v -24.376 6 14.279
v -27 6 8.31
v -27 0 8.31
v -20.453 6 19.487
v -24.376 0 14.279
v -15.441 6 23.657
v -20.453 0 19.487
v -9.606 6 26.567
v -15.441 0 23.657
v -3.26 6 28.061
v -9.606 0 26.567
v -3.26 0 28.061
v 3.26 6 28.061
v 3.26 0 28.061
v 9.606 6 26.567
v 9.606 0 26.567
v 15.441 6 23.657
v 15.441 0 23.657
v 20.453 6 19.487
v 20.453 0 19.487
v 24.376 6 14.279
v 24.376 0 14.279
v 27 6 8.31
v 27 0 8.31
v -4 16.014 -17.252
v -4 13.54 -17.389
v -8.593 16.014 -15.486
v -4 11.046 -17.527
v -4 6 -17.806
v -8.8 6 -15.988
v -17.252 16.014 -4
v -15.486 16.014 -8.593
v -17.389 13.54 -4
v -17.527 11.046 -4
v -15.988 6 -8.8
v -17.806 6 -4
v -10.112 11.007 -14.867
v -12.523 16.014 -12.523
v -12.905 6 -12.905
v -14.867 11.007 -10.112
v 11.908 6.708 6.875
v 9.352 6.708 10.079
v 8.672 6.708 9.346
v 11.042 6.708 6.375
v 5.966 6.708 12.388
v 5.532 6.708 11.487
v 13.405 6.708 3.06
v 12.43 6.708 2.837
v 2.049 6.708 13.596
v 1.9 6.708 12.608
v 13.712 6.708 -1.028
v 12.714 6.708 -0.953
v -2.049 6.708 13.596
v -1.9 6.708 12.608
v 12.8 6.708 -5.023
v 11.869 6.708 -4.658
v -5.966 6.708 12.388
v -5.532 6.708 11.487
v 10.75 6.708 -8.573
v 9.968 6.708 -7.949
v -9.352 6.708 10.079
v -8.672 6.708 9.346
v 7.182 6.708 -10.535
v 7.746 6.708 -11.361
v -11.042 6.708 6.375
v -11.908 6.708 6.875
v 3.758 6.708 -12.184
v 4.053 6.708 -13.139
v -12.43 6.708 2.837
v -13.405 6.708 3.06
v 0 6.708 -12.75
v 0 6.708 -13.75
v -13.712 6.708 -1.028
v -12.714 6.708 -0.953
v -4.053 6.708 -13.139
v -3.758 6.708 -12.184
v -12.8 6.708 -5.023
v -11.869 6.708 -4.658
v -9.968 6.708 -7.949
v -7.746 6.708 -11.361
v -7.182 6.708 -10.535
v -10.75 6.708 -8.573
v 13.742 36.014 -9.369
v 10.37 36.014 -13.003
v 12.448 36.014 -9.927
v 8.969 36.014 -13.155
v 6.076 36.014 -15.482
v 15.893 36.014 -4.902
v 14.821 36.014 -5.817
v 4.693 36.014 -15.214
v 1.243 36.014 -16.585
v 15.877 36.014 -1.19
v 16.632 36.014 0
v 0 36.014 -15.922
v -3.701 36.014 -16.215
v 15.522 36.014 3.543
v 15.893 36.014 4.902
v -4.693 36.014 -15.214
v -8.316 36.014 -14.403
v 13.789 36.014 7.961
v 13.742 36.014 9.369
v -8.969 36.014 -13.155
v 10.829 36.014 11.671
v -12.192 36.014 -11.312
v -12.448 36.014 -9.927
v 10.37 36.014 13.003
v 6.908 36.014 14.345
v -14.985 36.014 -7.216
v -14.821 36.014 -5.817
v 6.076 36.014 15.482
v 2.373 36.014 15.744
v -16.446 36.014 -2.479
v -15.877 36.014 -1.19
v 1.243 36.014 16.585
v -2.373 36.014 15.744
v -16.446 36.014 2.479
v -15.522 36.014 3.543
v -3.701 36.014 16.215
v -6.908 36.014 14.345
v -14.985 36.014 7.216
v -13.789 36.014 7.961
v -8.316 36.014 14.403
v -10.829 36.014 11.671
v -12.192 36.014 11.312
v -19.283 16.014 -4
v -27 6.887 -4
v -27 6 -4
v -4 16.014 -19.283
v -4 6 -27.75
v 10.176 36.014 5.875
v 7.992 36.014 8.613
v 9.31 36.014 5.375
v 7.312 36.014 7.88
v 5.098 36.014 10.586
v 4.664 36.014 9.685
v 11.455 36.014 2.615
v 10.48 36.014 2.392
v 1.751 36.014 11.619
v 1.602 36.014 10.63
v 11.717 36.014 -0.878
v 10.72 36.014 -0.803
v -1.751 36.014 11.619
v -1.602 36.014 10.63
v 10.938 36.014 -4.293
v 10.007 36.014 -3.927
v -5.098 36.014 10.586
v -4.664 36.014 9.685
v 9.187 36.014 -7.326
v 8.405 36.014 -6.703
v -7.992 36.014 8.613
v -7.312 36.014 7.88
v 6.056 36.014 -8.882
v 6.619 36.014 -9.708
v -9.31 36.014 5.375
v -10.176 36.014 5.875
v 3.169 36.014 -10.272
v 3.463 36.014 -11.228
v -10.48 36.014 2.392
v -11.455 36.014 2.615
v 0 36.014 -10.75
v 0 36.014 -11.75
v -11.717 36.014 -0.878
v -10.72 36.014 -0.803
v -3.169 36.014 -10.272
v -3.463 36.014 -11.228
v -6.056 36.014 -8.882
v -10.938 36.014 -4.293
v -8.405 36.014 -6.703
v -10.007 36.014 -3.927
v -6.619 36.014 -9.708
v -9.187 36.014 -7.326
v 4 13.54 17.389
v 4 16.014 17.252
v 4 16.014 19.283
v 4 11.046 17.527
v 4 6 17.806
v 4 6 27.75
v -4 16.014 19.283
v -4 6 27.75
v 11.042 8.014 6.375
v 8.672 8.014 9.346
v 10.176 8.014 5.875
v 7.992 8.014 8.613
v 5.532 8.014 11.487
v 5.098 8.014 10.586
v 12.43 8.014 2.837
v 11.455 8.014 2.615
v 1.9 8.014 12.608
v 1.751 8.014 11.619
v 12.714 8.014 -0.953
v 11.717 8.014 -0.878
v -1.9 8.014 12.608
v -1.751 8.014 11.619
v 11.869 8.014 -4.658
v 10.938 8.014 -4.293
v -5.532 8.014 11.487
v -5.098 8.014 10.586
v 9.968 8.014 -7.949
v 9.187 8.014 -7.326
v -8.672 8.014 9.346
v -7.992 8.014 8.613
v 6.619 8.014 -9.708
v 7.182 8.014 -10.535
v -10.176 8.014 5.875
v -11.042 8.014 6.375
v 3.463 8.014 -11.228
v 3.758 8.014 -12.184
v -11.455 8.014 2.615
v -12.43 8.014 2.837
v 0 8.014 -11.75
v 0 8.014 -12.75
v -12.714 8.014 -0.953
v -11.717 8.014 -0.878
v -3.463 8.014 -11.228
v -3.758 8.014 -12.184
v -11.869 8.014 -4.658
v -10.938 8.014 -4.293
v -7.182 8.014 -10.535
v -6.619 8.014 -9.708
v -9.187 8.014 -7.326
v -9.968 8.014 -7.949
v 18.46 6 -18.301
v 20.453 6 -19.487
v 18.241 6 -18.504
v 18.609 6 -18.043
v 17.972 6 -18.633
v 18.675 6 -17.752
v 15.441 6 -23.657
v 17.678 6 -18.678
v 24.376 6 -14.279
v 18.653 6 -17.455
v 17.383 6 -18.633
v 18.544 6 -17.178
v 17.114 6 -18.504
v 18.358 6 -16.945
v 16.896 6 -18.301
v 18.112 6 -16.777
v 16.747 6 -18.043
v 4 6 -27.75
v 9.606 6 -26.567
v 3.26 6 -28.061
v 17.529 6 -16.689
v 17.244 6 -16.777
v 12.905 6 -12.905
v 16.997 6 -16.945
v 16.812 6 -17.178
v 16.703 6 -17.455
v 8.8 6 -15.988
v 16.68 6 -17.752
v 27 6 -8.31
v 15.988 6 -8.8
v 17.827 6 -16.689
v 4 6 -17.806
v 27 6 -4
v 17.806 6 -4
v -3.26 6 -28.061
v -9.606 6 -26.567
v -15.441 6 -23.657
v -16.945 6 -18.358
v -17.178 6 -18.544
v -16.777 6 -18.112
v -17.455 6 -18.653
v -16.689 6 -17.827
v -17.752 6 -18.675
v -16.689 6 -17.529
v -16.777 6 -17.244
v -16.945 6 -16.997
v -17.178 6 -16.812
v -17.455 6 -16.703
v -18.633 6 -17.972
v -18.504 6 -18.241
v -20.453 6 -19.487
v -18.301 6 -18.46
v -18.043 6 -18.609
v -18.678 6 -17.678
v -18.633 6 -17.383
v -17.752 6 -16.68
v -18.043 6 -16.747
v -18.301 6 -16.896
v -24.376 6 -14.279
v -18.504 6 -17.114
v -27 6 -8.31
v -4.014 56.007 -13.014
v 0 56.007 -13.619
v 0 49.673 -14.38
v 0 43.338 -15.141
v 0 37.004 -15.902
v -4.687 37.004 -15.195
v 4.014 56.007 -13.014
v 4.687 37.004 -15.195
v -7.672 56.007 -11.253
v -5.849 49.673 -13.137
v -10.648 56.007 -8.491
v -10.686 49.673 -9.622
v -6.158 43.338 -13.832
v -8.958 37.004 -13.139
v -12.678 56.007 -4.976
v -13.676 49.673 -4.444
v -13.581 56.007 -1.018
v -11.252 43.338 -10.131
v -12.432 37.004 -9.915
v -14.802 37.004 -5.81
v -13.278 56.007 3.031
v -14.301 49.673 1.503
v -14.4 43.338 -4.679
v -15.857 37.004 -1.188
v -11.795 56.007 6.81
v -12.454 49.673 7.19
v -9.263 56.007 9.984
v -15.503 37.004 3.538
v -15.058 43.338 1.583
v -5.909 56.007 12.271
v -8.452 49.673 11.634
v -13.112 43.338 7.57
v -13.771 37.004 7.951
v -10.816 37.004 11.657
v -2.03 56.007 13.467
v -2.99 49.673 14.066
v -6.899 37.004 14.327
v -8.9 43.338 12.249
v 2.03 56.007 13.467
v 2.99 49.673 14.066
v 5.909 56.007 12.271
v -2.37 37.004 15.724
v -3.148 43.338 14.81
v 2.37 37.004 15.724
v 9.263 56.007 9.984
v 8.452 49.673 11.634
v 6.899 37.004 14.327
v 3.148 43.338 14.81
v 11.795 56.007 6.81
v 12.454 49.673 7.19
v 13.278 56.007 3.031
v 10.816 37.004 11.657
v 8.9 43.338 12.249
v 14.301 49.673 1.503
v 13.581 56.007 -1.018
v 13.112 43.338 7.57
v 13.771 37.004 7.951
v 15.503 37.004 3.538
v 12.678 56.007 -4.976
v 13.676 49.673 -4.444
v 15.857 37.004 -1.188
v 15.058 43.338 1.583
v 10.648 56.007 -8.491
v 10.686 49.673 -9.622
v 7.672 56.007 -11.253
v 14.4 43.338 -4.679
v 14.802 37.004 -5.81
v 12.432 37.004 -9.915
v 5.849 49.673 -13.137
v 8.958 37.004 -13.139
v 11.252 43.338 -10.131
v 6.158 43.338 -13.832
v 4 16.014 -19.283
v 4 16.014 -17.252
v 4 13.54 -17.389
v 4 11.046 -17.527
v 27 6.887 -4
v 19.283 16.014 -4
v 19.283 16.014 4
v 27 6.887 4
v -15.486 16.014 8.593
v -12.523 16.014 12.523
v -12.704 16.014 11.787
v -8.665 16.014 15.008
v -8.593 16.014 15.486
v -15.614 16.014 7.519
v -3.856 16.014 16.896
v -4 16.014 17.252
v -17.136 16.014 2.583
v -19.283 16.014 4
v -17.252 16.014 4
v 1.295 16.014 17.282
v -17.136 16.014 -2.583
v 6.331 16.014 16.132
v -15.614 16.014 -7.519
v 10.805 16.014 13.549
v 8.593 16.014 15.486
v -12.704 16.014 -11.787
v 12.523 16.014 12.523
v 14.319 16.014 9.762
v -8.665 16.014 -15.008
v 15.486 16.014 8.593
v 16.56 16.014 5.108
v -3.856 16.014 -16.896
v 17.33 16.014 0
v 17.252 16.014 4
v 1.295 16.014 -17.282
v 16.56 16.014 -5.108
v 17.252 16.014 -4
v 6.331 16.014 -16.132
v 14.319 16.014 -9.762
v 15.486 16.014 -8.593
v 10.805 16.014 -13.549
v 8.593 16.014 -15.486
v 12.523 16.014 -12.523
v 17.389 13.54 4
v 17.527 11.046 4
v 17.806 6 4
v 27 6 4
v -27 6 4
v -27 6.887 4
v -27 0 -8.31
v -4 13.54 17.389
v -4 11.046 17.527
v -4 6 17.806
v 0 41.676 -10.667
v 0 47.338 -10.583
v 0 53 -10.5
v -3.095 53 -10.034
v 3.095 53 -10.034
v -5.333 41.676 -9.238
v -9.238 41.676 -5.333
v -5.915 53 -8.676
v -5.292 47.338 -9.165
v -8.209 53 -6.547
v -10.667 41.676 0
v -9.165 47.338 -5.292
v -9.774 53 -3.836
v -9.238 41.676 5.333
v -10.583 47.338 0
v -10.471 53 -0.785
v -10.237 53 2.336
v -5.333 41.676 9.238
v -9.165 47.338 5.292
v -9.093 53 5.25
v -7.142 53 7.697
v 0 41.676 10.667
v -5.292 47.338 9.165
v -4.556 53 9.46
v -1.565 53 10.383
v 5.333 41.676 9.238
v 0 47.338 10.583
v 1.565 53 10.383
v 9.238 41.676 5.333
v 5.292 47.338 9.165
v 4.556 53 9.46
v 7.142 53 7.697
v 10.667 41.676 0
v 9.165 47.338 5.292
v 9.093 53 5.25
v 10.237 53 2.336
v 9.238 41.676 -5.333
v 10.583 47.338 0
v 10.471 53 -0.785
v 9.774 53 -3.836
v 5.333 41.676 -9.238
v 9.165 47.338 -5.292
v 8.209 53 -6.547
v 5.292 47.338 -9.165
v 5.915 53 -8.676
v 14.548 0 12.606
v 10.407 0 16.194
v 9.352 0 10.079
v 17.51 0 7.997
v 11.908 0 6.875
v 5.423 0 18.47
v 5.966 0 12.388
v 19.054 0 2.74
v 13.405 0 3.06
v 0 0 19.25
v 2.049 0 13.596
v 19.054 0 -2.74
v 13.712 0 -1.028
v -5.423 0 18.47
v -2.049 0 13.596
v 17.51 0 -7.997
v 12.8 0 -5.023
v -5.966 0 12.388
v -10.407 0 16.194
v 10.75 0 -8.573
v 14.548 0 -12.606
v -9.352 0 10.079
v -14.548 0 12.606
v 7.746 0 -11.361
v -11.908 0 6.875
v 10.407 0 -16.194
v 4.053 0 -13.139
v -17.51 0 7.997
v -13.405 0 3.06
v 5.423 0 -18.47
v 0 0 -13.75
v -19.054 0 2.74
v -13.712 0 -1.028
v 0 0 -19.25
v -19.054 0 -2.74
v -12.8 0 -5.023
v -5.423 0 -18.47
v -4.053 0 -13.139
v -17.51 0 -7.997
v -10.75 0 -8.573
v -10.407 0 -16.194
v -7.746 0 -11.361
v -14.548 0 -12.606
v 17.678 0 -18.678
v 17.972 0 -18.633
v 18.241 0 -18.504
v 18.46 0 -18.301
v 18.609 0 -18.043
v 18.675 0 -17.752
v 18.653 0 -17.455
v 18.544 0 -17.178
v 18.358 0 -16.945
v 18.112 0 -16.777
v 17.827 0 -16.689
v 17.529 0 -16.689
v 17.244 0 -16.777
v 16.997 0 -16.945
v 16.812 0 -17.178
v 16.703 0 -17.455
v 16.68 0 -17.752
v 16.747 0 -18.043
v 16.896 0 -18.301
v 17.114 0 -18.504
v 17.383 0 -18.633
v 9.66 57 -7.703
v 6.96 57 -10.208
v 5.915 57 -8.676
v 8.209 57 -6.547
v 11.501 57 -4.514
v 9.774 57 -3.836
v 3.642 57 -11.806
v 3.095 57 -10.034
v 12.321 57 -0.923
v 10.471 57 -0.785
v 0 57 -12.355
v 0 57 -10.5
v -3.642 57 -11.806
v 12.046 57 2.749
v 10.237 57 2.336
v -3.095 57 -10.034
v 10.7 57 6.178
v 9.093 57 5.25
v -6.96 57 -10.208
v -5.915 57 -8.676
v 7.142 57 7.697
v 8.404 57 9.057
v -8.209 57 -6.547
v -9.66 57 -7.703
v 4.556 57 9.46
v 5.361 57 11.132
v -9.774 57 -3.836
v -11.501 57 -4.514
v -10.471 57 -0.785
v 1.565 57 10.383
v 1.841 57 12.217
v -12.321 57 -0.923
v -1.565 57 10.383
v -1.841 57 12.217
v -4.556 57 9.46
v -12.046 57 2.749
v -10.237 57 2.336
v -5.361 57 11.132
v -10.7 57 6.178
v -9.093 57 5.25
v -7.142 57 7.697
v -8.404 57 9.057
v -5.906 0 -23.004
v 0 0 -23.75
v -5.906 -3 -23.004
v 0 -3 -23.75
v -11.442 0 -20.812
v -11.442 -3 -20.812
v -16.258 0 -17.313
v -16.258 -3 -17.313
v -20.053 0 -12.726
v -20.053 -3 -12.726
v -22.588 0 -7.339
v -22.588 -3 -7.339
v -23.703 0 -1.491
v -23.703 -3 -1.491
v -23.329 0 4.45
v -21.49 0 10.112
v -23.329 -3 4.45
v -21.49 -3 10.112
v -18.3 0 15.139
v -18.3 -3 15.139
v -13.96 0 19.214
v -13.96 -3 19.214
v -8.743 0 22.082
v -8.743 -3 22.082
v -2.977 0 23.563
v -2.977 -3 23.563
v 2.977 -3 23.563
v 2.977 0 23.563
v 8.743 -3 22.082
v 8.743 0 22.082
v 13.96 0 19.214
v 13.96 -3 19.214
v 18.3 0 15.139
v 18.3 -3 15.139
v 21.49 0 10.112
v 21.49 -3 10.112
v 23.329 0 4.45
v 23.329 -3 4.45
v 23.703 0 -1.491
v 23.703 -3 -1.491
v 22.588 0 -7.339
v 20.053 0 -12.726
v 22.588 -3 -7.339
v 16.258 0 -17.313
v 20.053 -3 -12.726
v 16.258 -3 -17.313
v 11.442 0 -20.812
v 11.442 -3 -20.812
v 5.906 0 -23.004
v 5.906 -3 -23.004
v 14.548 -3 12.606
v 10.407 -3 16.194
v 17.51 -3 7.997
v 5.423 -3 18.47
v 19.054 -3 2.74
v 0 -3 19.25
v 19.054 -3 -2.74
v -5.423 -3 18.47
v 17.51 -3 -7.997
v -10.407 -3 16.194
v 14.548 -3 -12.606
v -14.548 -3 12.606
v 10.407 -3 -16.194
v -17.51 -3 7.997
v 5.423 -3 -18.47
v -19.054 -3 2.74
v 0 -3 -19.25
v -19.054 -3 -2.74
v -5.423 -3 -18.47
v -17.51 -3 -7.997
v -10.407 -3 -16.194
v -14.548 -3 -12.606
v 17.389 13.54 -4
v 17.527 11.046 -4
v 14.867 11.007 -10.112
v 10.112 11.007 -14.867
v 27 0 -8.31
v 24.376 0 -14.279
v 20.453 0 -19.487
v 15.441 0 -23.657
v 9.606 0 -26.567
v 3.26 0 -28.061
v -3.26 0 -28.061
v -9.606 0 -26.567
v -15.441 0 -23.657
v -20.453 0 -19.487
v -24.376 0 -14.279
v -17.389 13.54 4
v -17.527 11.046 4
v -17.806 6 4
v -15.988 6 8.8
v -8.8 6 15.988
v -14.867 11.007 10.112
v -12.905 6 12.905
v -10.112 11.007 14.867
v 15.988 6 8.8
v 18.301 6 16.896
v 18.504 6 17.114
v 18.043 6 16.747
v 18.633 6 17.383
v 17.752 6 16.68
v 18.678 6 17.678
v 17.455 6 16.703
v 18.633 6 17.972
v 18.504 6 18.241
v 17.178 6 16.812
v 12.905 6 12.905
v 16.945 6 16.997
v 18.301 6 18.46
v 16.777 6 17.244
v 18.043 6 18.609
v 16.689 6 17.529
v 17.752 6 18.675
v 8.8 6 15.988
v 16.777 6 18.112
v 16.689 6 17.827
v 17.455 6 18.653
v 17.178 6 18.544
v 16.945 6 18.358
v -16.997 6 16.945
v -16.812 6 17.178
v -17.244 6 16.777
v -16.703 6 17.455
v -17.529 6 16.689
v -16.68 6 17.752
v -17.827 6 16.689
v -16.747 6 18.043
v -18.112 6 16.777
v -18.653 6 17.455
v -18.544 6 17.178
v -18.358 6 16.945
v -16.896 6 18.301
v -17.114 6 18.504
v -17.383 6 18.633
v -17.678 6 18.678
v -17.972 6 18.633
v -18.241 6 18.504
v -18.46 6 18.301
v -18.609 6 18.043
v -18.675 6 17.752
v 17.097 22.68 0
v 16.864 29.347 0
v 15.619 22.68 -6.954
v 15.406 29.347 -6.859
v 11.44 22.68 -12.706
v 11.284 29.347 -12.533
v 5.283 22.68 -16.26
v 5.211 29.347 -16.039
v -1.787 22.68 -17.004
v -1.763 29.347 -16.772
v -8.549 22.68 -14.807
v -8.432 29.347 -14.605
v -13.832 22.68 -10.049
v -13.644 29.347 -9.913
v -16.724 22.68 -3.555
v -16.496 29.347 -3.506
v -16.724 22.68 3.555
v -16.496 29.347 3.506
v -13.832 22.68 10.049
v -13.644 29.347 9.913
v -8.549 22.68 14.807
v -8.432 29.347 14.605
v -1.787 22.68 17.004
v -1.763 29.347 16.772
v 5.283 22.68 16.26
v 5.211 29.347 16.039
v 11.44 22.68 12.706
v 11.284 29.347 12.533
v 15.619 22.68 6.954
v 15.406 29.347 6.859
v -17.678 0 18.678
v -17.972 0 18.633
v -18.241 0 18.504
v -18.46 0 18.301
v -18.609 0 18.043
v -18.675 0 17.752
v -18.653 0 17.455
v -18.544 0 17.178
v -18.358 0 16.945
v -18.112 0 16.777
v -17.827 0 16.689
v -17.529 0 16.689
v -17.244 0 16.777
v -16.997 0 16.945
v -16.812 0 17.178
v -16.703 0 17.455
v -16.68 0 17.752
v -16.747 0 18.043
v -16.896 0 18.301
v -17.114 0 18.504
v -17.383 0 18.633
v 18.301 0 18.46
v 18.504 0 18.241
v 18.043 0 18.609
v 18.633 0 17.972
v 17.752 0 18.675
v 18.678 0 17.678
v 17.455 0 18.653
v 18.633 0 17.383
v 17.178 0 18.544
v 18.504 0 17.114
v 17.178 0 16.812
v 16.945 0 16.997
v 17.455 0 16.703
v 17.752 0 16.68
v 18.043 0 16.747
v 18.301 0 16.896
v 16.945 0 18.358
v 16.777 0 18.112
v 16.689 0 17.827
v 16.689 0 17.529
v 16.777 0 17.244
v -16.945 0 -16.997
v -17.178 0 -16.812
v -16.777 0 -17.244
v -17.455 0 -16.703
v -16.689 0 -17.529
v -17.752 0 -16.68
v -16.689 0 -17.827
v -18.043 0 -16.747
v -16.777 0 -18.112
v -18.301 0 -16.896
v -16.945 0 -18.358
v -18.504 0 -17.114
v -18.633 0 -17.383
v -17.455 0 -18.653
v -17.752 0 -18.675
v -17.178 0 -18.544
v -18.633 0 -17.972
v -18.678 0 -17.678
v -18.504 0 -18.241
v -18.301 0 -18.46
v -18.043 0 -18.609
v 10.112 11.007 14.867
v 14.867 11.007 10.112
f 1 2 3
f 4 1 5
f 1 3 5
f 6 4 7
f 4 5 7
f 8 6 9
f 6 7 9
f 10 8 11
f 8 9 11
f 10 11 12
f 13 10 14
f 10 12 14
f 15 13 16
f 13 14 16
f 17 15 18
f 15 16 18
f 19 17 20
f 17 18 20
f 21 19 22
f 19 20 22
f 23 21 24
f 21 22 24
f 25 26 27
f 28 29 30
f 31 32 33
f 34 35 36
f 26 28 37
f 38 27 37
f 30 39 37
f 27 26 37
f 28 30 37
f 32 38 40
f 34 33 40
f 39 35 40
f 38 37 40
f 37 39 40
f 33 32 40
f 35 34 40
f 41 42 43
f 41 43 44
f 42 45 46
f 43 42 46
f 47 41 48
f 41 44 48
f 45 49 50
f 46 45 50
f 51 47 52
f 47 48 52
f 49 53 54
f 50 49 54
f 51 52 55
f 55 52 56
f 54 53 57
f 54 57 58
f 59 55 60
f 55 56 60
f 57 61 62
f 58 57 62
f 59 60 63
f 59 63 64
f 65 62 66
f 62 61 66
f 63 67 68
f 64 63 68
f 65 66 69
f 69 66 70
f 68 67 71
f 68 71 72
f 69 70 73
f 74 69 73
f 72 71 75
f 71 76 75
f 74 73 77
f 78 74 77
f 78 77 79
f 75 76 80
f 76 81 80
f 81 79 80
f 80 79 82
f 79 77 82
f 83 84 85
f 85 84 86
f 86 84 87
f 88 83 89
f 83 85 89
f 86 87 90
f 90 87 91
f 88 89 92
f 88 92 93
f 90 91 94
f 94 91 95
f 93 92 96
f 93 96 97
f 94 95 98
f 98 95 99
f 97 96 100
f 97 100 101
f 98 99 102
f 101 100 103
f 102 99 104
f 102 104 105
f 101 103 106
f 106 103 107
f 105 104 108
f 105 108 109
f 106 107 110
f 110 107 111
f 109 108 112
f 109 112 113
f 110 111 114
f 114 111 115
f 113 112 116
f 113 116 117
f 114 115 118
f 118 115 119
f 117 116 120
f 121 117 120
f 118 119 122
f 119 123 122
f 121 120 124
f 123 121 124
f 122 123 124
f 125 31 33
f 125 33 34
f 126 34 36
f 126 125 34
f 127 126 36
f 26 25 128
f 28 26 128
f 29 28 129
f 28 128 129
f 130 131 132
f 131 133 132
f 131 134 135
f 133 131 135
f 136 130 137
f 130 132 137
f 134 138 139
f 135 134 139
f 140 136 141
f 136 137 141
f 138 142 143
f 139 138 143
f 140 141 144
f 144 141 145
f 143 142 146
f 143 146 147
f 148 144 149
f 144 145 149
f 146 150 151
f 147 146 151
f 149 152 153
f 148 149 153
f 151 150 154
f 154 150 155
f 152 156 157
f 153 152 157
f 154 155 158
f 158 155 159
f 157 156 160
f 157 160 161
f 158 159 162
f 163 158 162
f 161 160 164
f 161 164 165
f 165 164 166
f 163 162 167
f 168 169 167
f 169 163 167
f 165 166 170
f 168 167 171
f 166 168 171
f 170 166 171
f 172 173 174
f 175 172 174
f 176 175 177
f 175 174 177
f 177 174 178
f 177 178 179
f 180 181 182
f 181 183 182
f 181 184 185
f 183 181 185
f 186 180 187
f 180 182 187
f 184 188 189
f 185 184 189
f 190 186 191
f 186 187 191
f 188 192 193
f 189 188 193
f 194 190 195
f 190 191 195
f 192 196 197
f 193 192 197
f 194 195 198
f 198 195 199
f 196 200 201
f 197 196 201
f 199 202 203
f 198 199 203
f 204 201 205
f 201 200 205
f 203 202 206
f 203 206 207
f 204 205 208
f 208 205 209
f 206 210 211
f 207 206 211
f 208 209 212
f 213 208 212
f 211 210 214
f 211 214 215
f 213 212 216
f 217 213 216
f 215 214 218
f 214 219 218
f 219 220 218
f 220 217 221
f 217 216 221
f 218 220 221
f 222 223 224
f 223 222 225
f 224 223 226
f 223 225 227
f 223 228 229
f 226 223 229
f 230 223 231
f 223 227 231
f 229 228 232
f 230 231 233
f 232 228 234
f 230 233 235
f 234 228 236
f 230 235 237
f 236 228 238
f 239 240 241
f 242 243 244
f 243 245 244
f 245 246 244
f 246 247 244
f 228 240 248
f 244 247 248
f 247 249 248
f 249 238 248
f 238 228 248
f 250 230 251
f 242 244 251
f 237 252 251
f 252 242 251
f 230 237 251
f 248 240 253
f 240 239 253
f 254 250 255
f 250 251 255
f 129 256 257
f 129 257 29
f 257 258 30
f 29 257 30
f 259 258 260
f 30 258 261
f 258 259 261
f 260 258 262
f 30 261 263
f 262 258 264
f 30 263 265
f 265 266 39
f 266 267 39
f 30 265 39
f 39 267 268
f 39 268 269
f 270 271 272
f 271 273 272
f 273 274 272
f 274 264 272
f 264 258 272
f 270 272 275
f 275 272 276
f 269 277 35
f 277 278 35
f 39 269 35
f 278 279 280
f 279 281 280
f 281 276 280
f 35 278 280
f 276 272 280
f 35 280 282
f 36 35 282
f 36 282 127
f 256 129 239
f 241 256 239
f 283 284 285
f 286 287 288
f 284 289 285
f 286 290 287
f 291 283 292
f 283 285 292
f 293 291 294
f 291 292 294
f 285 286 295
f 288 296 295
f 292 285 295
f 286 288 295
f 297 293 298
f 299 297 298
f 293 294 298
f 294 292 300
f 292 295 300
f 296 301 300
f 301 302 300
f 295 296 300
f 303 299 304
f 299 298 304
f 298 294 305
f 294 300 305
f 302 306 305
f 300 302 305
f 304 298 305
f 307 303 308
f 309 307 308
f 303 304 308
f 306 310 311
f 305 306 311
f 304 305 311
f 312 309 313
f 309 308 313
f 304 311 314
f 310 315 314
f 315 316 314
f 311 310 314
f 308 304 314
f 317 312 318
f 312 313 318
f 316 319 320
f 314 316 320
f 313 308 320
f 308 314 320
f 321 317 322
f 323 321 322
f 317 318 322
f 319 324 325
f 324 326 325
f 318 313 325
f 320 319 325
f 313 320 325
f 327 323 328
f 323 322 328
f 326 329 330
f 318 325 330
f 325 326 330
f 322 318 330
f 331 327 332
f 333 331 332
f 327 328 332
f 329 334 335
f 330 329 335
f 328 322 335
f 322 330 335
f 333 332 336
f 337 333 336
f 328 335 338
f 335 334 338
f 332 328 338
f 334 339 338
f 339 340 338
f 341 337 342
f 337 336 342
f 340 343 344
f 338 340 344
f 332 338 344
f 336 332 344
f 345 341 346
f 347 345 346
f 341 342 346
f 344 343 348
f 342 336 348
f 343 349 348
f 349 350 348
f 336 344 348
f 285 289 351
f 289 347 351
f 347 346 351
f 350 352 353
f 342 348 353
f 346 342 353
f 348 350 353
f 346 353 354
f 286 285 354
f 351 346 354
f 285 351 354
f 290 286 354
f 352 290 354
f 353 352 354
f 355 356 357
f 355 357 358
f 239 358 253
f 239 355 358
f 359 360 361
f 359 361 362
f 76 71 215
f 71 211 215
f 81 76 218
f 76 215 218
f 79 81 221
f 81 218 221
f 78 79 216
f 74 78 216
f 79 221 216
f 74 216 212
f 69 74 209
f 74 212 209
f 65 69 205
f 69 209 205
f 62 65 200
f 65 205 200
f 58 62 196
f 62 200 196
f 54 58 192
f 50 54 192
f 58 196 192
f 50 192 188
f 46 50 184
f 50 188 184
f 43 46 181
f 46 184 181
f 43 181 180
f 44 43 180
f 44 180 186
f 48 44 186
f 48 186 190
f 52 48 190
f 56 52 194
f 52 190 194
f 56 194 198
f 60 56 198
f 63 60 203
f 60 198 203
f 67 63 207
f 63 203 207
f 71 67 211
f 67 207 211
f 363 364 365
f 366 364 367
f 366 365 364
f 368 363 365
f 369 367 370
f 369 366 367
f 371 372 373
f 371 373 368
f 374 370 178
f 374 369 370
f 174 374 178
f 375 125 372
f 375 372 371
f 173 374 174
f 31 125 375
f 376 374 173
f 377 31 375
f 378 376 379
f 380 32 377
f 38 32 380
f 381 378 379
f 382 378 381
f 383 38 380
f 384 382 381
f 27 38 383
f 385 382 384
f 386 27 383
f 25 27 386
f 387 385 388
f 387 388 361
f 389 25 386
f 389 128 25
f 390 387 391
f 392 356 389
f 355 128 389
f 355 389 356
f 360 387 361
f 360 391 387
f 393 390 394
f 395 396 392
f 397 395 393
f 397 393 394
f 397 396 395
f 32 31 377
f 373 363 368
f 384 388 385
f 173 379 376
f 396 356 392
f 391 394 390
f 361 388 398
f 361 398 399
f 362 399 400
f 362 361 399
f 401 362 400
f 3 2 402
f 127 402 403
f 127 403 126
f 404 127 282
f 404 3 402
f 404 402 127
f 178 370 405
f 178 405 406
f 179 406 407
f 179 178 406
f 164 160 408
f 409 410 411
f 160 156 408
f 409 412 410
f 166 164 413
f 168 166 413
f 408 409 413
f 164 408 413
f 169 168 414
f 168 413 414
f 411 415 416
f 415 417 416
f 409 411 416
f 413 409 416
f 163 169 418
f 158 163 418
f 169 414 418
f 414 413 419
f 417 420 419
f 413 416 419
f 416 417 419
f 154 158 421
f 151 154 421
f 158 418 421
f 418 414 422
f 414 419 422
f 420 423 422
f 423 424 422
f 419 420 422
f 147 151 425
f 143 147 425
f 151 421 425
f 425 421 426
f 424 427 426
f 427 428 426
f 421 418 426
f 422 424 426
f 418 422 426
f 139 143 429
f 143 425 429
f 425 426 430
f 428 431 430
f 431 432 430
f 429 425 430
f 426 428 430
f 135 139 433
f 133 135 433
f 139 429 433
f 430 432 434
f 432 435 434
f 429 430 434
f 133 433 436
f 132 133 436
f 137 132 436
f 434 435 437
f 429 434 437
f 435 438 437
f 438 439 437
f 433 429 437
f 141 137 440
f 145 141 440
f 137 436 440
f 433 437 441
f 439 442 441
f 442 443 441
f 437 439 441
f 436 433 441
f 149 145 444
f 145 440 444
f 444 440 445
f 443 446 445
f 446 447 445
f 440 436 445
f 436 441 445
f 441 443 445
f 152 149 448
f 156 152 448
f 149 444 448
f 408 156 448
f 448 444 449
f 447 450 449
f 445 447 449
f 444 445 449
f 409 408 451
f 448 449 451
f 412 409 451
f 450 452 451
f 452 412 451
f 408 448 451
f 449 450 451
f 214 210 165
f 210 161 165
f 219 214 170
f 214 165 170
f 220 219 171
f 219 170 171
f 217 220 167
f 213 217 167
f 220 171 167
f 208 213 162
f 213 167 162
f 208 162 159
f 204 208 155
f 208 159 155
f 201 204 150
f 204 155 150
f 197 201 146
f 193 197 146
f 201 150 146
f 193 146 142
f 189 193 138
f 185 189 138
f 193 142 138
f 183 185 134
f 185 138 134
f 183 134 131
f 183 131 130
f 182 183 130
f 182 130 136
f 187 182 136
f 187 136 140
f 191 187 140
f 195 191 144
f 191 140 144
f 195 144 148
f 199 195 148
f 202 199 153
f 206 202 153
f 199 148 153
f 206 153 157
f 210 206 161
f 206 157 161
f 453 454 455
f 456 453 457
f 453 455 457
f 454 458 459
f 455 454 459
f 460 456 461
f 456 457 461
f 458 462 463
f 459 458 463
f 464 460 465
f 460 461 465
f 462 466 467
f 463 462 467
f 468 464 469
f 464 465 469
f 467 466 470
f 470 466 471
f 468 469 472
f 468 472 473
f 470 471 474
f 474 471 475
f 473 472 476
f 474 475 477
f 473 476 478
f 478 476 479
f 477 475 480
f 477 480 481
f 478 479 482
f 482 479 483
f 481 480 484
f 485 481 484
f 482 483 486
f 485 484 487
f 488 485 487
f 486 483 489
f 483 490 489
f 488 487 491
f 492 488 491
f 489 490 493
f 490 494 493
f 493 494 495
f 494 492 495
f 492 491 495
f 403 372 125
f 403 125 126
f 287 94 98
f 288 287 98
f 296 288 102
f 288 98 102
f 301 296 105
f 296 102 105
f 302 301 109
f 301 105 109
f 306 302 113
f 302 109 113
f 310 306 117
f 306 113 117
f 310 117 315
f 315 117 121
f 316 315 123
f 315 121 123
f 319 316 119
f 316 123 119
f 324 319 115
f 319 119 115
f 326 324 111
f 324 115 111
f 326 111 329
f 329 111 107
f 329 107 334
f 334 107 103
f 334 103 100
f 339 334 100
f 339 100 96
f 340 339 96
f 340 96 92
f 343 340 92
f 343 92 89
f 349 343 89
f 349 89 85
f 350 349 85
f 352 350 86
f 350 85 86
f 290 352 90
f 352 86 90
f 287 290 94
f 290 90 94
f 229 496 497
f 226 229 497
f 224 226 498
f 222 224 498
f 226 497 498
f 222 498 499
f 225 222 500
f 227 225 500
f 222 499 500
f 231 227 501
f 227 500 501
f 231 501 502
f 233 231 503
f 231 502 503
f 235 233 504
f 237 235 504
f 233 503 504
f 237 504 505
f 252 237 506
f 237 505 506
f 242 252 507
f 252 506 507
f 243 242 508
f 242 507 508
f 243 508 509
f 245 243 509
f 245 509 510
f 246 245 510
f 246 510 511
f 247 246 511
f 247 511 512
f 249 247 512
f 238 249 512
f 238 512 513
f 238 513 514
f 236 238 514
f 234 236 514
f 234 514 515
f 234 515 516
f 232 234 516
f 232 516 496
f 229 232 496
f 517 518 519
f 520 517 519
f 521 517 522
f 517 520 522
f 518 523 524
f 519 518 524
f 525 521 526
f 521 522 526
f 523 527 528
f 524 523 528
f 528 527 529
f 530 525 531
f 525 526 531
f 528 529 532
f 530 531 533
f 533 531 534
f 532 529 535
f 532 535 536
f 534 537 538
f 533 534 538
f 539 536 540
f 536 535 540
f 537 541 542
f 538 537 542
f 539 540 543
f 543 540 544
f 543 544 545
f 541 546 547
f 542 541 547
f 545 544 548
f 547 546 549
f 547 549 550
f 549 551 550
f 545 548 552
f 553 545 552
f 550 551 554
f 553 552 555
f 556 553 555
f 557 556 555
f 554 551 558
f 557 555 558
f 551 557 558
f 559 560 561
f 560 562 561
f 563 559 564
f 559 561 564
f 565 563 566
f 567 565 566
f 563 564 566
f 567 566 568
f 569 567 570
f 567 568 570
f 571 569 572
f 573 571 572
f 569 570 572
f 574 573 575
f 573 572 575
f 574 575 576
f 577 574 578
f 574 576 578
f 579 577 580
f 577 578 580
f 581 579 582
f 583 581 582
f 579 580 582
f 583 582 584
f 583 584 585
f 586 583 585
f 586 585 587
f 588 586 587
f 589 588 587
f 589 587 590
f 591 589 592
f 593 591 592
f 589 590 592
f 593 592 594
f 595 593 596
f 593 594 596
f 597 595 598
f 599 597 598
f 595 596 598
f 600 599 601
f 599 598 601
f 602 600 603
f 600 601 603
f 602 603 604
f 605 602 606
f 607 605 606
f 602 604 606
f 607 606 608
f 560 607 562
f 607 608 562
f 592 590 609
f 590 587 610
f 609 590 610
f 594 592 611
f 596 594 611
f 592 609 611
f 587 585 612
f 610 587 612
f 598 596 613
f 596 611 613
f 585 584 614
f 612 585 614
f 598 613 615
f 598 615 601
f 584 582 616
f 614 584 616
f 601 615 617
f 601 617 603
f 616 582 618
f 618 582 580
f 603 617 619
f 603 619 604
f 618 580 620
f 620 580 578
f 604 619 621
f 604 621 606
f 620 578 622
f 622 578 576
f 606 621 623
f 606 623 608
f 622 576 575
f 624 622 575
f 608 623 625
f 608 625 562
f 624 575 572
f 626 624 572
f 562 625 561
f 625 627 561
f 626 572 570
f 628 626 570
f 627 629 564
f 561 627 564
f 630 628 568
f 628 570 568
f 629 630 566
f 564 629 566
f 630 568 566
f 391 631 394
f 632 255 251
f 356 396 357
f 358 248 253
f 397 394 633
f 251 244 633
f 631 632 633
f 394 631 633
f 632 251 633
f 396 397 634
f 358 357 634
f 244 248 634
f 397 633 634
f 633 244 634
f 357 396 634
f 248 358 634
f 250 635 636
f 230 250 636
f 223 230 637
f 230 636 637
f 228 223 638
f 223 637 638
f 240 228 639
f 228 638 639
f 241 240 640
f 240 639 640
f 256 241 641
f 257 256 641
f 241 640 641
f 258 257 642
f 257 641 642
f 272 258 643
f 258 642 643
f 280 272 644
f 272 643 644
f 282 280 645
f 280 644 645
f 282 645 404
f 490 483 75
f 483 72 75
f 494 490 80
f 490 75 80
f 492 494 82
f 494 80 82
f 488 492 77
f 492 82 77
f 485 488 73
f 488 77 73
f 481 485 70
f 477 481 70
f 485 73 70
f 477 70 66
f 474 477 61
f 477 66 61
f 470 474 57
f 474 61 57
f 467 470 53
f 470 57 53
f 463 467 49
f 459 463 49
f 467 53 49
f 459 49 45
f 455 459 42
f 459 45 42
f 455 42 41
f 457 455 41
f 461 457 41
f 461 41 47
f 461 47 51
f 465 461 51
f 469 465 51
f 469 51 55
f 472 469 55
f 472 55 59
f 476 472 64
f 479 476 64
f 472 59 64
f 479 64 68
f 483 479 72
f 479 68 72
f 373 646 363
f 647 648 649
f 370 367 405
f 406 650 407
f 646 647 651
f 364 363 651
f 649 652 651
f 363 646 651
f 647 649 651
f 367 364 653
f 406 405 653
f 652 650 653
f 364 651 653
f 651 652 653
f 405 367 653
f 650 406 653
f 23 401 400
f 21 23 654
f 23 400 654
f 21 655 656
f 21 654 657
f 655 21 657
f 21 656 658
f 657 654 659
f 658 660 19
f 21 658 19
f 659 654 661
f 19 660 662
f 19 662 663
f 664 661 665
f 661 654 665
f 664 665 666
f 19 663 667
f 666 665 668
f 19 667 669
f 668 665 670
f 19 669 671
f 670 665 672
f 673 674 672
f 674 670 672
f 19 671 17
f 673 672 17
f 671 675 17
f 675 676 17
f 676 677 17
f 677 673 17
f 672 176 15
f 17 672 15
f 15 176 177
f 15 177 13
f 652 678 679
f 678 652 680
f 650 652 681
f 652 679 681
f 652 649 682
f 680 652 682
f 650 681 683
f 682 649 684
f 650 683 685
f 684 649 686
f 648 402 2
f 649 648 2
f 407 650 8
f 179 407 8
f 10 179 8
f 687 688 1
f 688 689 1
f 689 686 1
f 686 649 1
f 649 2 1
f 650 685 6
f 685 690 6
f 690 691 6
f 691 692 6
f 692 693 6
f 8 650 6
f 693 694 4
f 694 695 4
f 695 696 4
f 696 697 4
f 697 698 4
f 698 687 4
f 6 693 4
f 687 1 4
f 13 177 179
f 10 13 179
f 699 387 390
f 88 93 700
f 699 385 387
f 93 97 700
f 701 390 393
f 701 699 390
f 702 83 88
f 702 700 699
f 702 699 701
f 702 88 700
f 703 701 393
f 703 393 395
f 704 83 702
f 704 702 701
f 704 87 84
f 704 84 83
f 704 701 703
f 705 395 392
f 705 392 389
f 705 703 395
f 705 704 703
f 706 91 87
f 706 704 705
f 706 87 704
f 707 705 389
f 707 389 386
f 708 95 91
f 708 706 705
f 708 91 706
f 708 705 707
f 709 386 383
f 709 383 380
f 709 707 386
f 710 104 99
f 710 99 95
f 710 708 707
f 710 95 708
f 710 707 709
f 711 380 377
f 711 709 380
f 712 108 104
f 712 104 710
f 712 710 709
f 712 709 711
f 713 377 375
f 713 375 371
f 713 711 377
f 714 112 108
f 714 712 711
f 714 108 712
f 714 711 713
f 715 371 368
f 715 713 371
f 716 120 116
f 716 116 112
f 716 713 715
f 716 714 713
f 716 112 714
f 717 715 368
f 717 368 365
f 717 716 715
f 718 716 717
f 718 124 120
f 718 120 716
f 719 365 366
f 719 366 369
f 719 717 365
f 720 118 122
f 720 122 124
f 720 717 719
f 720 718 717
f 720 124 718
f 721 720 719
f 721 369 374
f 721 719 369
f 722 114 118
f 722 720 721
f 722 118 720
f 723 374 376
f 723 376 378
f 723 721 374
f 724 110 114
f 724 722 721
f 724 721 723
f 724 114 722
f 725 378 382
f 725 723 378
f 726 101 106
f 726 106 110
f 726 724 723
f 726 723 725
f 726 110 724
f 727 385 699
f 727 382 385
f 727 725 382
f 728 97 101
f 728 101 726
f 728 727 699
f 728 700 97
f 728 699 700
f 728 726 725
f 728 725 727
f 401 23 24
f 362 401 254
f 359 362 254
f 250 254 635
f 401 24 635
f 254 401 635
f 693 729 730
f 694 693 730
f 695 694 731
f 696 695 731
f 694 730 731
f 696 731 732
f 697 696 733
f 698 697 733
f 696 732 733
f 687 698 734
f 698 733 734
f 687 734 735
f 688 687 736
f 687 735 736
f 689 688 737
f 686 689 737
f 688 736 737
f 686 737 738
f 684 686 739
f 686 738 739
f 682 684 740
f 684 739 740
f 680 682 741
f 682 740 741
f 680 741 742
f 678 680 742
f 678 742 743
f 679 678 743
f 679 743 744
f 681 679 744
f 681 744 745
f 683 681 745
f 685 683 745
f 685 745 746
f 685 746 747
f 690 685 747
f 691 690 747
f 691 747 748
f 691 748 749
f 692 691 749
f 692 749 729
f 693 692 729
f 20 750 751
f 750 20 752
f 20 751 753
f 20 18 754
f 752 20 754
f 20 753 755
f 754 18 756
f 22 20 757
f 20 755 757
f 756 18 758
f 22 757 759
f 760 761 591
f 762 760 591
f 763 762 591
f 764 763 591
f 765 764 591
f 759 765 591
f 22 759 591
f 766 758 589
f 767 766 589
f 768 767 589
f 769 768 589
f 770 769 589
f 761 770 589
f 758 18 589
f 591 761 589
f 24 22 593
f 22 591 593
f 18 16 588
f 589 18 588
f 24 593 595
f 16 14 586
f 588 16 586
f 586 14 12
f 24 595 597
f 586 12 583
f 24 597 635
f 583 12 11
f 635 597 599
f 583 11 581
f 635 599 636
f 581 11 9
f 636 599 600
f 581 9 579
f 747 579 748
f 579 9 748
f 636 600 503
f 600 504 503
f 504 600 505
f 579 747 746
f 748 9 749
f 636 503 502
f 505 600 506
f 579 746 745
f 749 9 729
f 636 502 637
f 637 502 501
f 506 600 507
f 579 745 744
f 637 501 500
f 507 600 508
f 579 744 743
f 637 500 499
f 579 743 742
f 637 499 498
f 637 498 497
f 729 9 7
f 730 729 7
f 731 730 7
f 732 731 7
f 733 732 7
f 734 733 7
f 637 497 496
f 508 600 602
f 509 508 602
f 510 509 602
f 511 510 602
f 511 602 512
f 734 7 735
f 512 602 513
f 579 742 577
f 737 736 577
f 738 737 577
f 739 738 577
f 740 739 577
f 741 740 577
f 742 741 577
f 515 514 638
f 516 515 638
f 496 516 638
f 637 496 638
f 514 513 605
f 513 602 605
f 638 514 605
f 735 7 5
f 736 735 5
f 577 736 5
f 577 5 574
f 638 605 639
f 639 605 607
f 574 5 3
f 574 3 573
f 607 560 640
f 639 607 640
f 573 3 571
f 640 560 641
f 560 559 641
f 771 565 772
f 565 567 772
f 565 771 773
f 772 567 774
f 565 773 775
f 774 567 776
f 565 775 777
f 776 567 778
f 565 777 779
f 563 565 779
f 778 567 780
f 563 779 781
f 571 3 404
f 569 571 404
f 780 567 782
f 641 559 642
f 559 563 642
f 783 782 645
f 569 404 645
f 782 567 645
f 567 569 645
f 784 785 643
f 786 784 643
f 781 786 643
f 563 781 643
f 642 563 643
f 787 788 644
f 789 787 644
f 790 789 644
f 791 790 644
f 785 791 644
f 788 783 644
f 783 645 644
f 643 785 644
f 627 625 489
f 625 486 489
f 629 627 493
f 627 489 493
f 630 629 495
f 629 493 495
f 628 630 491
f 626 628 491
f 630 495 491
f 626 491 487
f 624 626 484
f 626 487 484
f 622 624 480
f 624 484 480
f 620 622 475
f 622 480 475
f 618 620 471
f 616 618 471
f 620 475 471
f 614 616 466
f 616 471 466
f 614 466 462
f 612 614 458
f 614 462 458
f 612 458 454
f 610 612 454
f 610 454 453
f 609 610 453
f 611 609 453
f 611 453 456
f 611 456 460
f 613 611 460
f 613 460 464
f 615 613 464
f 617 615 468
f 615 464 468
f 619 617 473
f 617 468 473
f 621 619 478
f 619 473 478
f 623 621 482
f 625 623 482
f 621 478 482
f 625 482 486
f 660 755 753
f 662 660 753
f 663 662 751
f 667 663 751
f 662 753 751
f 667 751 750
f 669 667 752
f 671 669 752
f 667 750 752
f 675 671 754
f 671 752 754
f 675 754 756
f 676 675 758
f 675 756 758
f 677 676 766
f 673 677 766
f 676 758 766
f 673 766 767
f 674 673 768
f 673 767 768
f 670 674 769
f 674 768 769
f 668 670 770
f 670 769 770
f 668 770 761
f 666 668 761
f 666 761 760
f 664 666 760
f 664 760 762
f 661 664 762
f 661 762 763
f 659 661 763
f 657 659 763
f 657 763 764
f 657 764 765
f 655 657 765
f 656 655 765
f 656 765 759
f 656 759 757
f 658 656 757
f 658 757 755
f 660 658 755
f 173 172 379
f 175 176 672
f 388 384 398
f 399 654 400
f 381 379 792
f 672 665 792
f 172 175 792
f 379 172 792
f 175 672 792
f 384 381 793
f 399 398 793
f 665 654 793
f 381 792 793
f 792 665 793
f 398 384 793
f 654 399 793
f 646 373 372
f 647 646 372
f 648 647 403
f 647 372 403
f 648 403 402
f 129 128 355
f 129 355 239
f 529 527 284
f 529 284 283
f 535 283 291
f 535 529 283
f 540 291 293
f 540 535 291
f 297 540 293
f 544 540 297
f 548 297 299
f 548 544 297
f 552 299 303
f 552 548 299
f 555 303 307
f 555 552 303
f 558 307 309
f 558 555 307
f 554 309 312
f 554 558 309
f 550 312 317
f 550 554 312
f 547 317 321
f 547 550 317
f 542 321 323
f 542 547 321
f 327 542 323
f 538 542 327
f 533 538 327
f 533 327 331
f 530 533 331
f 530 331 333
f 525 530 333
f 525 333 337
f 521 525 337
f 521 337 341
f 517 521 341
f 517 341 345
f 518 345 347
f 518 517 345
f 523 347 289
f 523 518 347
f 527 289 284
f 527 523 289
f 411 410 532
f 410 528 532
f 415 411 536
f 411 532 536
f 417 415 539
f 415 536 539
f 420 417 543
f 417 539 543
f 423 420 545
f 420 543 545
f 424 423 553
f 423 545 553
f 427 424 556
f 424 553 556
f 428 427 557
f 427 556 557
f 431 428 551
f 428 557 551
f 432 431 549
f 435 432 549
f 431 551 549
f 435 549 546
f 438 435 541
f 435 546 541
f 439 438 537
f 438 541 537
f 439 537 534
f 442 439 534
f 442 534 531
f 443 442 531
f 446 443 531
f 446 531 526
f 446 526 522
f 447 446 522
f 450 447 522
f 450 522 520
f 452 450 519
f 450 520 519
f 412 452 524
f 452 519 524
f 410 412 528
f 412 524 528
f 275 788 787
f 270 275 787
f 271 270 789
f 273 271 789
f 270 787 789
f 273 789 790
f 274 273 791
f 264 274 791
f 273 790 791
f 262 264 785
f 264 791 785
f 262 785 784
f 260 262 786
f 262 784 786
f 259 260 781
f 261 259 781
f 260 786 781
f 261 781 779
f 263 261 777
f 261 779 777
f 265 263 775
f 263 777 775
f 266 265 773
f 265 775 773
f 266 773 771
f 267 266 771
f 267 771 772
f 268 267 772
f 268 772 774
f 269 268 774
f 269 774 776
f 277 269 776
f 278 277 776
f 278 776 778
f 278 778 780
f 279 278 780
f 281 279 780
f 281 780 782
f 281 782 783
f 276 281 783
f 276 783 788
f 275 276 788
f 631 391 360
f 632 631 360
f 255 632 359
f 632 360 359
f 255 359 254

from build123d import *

# Parameters (mm, degrees)
RIB1_REACH          = 71.607
SKETCH3_WALL_W      = 156.928914452
SKETCH3_WALL_H      = 8
CHAMFER1_SIZE       = 2
CHAMFER1_SIZE2      = 20
CHAMFER2_SIZE       = 1
CHAMFER2_SIZE2      = 1.144674394
CIRPATTERN23_COUNT  = 4
CUT_EXTRUDE7_REACH  = 71.607
SKETCH5_R           = 1
CIRPATTERN24_COUNT  = 4
SKETCH4_OUTSIDE_W   = 79.882
SKETCH4_OUTSIDE_H   = 79.882
SKETCH4_OUTSIDE_R   = 16.631613782
CUT_EXTRUDE8_DEPTH  = 20
CUT_EXTRUDE8_DRAFT  = -2
SKETCH7_OUTSIDE_W   = 78.484
SKETCH7_OUTSIDE_H   = 78.484
SKETCH7_OUTSIDE_W_2 = 54
SKETCH7_OUTSIDE_H_2 = 56.5
CUT_EXTRUDE9_DEPTH  = 57


with BuildPart() as part:
    # Sketch1 → Revolve1 (revolve)
    with BuildSketch(Plane(origin=(0, 0, 0), x_dir=(0, 0, -1), z_dir=(1, 0, 0))):
        Polygon((10.5, 57), (15.5, 57), (15.921613782, 36.013708049), (16.631613782, 36.013708049), (18.25, 6), (28.25, 6), (28.25, 0), (23.75, 0), (23.75, -3), (19.25, -3), (19.25, 0), (13.75, 0), (13.75, 6.707783598), (12.75, 6.707783598), (12.75, 8.013708049), (11.75, 8.013708049), (11.75, 36.013708049), (10.75, 36.013708049), (10.5, 53), align=None)
    revolve(axis=Axis((0, 0, 0), (0, 1, 0)))

    # Sketch3 wall → Rib1 (add, up to next)
    with BuildSketch(Plane(origin=(22.676470588, 12, 0), x_dir=(0.645690512921, -0.763599215245, 0), z_dir=(0.763599215245, 0.645690512921, 0)), mode=Mode.PRIVATE) as rib1_sk1:
        Rectangle(SKETCH3_WALL_W, SKETCH3_WALL_H)
    rib1_tool1 = extrude(rib1_sk1.sketch, amount=-RIB1_REACH, mode=Mode.PRIVATE) - part.part
    rib1 = rib1_tool1.solids().sort_by_distance((22.676470588, 12, 0))[0]
    add(rib1)

    # Chamfer1
    chamfer1_edges = [part.edges().sort_by_distance(p)[0] for p in [
        (0, 57, 15.5),
    ]]
    chamfer1_side = [part.faces().sort_by_distance(p)[0] for p in [
        (0, 57, 10.938406204),
    ]]
    chamfer(chamfer1_edges, length=CHAMFER1_SIZE, length2=CHAMFER1_SIZE2, reference=chamfer1_side[0])

    # Chamfer2
    chamfer2_edges = [part.edges().sort_by_distance(p)[0] for p in [
        (0, 57, 13.5),
    ]]
    chamfer2_side = [part.faces().sort_by_distance(p)[0] for p in [
        (0, 47.002017422, 14.700859078),
    ]]
    chamfer(chamfer2_edges, length=CHAMFER2_SIZE, length2=CHAMFER2_SIZE2, reference=chamfer2_side[0])

    # CirPattern23: Rib1 ×4 about axis
    cirpattern23_axis = Axis((0, 0, 0), (0, 1, 0))
    for i in range(1, CIRPATTERN23_COUNT):
        add(rib1.rotate(cirpattern23_axis, i * 360 / CIRPATTERN23_COUNT))

    # Sketch5 → Cut-Extrude7 (cut, up to next)
    with BuildSketch(Plane.XZ, mode=Mode.PRIVATE) as cut_extrude7_sk1:
        with Locations(Location((17.67766953, -17.67766953, 0), (0, 0, 270))):
            Circle(SKETCH5_R)
    cut_extrude7_tool1 = extrude(cut_extrude7_sk1.sketch, amount=-CUT_EXTRUDE7_REACH, mode=Mode.PRIVATE) & part.part
    cut_extrude7 = cut_extrude7_tool1.solids().sort_by_distance((17.67767, 0, -17.67767))[0]
    add(cut_extrude7, mode=Mode.SUBTRACT)

    # CirPattern24: Cut-Extrude7 ×4 about axis
    cirpattern24_axis = Axis((0, 0, 0), (0, 1, 0))
    for i in range(1, CIRPATTERN24_COUNT):
        add(cut_extrude7.rotate(cirpattern24_axis, i * 360 / CIRPATTERN24_COUNT), mode=Mode.SUBTRACT)


with BuildPart() as cut_extrude8_tool:
    # Sketch4 outside → Cut-Extrude8 (with draft: the straight prism first)
    with BuildSketch(Plane(origin=(0, 36.013708049, 0), x_dir=(1, 0, 0), z_dir=(0, 1, 0))):
        Rectangle(SKETCH4_OUTSIDE_W, SKETCH4_OUTSIDE_H)
        Circle(SKETCH4_OUTSIDE_R, mode=Mode.SUBTRACT)
    extrude(amount=-CUT_EXTRUDE8_DEPTH)
    # Cut-Extrude8: the draft: its side faces are tilted about the plane it starts from
    cut_extrude8_sides = [cut_extrude8_tool.faces().sort_by_distance(p)[0] for p in [
        (0, 26.013708049, 39.941),
        (39.941, 26.013708049, 0),
        (0, 26.013708049, -39.941),
        (-39.941, 26.013708049, 0),
        (-16.631613782, 26.013708049, 0),
    ]]
    draft(cut_extrude8_sides, Plane(origin=(0, 36.013708049, 0), x_dir=(1, 0, 0), z_dir=(0, 1, 0)), CUT_EXTRUDE8_DRAFT)


with BuildPart() as part_1:
    add(part.part)

    # Cut-Extrude8: cut by cut_extrude8_tool
    add(cut_extrude8_tool.part, mode=Mode.SUBTRACT)

    # Sketch7 outside → Cut-Extrude9 (cut)
    with BuildSketch(Plane(origin=(0, 0, 0), x_dir=(1, 0, 0), z_dir=(0, 1, 0))):
        Rectangle(SKETCH7_OUTSIDE_W, SKETCH7_OUTSIDE_H)
        Rectangle(SKETCH7_OUTSIDE_W_2, SKETCH7_OUTSIDE_H_2, mode=Mode.SUBTRACT)
    extrude(amount=CUT_EXTRUDE9_DEPTH, mode=Mode.SUBTRACT)


solid = part_1.part
